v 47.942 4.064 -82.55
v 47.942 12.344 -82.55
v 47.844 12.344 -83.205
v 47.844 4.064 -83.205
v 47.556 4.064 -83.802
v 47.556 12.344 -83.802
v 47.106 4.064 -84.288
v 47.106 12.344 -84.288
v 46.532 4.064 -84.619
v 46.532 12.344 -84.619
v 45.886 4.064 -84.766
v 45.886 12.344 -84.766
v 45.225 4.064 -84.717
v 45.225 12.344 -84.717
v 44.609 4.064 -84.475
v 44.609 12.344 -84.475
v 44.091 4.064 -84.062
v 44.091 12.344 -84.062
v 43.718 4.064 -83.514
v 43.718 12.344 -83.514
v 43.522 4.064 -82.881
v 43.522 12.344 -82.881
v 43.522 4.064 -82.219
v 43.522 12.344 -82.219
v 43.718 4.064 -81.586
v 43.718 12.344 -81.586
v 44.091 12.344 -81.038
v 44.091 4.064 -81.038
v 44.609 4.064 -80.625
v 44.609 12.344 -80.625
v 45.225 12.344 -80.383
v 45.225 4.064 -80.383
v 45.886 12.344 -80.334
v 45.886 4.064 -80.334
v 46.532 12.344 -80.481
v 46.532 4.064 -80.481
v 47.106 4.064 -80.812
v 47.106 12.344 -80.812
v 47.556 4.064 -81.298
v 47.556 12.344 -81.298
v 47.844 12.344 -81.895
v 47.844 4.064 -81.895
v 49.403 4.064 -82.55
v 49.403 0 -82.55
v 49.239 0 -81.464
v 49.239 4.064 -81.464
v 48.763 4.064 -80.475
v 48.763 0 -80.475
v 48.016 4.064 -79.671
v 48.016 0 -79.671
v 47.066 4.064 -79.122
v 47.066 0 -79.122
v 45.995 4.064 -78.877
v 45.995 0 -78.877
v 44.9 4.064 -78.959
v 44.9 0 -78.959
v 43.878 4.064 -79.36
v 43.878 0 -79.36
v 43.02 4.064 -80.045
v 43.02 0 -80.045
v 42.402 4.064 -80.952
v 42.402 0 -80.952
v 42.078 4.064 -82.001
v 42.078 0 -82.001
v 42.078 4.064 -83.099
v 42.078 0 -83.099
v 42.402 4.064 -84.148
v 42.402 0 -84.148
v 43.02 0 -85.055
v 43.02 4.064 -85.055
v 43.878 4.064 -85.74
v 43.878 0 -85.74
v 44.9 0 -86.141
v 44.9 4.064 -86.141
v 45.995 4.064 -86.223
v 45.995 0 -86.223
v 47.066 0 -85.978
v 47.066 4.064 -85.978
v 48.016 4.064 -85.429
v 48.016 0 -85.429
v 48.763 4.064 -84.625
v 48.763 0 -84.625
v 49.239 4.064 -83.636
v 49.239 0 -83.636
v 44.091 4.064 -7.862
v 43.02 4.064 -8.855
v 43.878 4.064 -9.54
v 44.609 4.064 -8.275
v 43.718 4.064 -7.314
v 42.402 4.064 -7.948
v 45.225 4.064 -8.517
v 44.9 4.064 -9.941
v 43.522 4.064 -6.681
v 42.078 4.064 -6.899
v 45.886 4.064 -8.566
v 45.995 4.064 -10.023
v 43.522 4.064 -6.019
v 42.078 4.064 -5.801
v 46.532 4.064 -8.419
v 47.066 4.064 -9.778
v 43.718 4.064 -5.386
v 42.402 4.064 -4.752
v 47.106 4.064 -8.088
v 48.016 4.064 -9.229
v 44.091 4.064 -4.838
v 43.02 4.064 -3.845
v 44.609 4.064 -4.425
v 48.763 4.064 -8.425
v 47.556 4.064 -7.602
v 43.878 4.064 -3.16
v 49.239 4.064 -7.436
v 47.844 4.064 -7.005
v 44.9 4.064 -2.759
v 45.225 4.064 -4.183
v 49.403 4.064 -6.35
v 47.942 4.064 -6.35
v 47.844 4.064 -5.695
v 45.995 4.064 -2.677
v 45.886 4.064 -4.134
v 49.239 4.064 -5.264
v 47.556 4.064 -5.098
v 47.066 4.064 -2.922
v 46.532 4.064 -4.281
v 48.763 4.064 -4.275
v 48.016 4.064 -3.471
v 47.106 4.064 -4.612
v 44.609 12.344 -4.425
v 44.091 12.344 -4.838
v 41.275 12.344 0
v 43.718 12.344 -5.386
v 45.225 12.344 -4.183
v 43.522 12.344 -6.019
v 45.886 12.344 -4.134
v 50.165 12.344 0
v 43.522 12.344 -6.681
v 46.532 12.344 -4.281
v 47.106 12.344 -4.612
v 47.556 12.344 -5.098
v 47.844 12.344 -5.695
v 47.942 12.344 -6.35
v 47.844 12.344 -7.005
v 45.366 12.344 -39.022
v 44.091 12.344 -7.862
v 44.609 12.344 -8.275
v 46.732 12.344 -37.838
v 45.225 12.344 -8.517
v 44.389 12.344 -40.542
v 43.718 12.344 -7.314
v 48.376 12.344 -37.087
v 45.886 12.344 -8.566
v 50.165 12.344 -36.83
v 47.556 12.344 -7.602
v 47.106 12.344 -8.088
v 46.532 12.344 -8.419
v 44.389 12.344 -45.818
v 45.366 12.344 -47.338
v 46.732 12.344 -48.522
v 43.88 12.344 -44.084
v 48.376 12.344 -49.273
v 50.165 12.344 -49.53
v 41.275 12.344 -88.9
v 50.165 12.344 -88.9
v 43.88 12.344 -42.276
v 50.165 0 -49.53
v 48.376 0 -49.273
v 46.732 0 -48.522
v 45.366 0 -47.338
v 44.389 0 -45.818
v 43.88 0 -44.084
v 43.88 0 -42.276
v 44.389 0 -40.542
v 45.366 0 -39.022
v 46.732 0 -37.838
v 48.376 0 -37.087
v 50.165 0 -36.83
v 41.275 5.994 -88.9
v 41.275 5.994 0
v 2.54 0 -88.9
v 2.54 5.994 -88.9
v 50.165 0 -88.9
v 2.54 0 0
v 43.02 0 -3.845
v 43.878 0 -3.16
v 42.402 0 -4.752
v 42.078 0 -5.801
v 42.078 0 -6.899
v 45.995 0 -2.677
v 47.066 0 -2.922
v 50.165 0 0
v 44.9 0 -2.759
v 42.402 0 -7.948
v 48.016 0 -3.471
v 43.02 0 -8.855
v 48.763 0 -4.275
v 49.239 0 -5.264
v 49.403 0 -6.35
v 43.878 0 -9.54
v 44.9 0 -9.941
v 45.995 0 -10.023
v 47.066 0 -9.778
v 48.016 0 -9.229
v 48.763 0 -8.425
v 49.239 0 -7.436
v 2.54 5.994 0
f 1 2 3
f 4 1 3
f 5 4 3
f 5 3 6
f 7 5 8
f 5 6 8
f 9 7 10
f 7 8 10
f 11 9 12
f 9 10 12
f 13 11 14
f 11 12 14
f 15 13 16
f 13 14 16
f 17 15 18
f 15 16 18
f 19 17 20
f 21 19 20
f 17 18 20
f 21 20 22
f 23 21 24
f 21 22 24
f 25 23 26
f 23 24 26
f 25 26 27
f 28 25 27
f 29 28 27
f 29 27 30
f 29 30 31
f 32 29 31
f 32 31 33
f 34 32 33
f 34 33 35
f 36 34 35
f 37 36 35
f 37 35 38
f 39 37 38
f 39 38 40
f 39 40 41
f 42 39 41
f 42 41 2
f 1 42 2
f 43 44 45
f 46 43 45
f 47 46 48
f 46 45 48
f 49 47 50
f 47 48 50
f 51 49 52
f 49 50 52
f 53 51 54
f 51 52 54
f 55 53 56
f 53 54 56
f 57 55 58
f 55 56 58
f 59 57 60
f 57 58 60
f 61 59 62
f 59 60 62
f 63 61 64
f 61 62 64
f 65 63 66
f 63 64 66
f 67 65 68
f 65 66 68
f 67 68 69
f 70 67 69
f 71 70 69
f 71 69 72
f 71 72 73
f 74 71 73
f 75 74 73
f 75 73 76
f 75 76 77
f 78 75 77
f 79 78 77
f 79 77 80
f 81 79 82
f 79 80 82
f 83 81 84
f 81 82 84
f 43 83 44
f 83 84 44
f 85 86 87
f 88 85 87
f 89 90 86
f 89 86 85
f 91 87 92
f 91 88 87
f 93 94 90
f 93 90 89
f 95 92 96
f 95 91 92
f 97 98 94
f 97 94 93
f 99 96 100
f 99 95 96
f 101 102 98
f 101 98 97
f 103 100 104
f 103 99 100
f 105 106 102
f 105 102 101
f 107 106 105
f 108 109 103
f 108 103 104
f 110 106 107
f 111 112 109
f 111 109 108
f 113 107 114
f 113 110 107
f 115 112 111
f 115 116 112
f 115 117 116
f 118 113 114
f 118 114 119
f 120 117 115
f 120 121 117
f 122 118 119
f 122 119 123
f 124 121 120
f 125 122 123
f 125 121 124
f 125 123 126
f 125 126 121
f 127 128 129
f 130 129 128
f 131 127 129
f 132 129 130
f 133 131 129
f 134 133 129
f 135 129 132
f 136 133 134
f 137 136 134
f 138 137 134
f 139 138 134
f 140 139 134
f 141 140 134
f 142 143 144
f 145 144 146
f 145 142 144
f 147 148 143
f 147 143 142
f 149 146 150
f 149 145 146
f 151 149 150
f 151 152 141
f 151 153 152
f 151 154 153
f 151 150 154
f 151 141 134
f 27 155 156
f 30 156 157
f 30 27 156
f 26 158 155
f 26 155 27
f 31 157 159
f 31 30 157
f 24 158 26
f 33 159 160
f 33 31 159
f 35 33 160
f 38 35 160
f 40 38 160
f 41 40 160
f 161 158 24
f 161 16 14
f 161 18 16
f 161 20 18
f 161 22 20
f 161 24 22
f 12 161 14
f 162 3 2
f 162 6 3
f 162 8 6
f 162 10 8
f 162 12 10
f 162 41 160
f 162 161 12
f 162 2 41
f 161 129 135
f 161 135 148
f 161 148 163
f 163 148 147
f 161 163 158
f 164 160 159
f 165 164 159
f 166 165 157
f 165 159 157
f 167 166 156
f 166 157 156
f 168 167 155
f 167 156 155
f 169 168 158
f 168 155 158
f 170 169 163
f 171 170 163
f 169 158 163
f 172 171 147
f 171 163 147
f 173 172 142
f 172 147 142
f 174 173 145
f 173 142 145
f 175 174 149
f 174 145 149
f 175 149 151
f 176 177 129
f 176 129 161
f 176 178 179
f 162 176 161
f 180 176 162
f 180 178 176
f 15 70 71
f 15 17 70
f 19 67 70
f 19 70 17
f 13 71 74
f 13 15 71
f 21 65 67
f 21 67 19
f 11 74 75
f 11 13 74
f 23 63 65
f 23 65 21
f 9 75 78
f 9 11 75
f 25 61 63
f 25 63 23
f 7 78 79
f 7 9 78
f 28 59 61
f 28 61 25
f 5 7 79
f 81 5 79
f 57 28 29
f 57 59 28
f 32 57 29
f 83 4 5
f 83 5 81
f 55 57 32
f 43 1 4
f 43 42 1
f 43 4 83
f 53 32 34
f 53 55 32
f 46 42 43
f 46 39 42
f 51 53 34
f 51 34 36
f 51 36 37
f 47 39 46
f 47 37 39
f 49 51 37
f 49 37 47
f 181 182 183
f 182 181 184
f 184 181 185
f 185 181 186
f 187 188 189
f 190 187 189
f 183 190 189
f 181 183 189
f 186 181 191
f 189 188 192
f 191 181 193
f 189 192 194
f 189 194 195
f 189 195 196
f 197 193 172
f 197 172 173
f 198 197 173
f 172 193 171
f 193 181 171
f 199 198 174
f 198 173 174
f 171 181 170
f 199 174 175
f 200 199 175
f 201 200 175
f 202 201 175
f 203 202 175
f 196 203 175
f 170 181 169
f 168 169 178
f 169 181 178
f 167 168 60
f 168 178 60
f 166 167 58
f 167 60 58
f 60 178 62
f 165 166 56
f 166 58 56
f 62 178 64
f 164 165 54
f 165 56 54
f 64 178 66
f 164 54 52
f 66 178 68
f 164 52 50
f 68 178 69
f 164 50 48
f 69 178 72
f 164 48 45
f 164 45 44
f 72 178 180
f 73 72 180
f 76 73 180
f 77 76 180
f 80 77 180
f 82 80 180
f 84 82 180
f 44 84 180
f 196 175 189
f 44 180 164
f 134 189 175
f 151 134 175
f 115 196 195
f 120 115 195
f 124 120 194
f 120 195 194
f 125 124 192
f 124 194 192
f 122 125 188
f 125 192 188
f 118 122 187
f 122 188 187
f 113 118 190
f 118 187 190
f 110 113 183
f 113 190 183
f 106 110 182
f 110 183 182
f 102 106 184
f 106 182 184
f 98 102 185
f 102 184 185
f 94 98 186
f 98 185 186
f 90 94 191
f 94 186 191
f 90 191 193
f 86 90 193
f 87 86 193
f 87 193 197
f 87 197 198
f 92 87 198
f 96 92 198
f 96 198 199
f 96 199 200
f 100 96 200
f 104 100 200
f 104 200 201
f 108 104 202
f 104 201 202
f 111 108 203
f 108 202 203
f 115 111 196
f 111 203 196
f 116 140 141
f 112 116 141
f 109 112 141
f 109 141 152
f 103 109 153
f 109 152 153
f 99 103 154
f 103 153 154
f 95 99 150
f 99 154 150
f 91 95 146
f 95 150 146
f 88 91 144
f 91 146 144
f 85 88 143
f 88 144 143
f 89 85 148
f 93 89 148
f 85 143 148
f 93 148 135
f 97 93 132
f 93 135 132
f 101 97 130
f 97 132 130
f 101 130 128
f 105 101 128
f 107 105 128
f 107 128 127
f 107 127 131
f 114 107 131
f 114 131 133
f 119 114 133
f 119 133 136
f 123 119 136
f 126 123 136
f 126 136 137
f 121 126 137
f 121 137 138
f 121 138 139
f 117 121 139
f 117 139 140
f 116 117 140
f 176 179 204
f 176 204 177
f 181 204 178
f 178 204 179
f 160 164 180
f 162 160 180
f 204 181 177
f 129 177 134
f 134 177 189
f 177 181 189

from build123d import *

# Parameters (mm, degrees)
SKETCH1_W               = 41.275
SKETCH1_H               = 88.9
BOSS_EXTRUDE1_DEPTH     = 5.9944
SKETCH1_5_W             = 8.89
SKETCH1_5_H             = 88.9
BOSS_EXTRUDE2_DEPTH     = 12.3444
SKETCH3_R               = 2.2225
CUT_EXTRUDE1_DEPTH      = 1
CUT_EXTRUDE1_DEPTH_BACK = 13.3444
SKETCH4_R               = 3.683
CUT_EXTRUDE2_DEPTH      = 4.064
SKETCH5_W               = 2.54
SKETCH5_H               = 88.9
CUT_EXTRUDE3_DEPTH      = 7.35
CUT_EXTRUDE3_DEPTH_BACK = 6.9944
SKETCH6_R               = 6.35
CUT_EXTRUDE4_DEPTH      = 1
CUT_EXTRUDE4_DEPTH_BACK = 13.3444


with BuildPart() as part:
    # Sketch1 → Boss-Extrude1 (new body)
    with BuildSketch(Plane(origin=(0, 0, 0), x_dir=(1, 0, 0), z_dir=(0, 1, 0))):
        with Locations((20.6375, 44.45)):
            Rectangle(SKETCH1_W, SKETCH1_H)
    extrude(amount=BOSS_EXTRUDE1_DEPTH)

    # Sketch1<5> → Boss-Extrude2 (add)
    with BuildSketch(Plane(origin=(0, 0, 0), x_dir=(1, 0, 0), z_dir=(0, 1, 0))):
        with Locations((45.72, 44.45)):
            Rectangle(SKETCH1_5_W, SKETCH1_5_H)
    extrude(amount=BOSS_EXTRUDE2_DEPTH)

    # Sketch3 → Cut-Extrude1 (cut, two sides)
    with BuildSketch(Plane(origin=(0, 12.3444, 0), x_dir=(1, 0, 0), z_dir=(0, 1, 0))) as cut_extrude1_sk:
        with Locations((45.72, 82.55)):
            Circle(SKETCH3_R)
        with Locations((45.72, 6.35)):
            Circle(SKETCH3_R)
    extrude(amount=CUT_EXTRUDE1_DEPTH, mode=Mode.SUBTRACT)
    extrude(cut_extrude1_sk.sketch, amount=-CUT_EXTRUDE1_DEPTH_BACK, mode=Mode.SUBTRACT)

    # Sketch4 → Cut-Extrude2 (cut)
    with BuildSketch(Plane.XZ):
        with Locations((45.72, -6.35)):
            Circle(SKETCH4_R)
        with Locations((45.72, -82.55)):
            Circle(SKETCH4_R)
    extrude(amount=-CUT_EXTRUDE2_DEPTH, mode=Mode.SUBTRACT)

    # Sketch5 → Cut-Extrude3 (cut, two sides)
    with BuildSketch(Plane(origin=(0, 5.9944, 0), x_dir=(1, 0, 0), z_dir=(0, 1, 0))) as cut_extrude3_sk:
        with Locations((1.27, 44.45)):
            Rectangle(SKETCH5_W, SKETCH5_H)
    extrude(amount=CUT_EXTRUDE3_DEPTH, mode=Mode.SUBTRACT)
    extrude(cut_extrude3_sk.sketch, amount=-CUT_EXTRUDE3_DEPTH_BACK, mode=Mode.SUBTRACT)

    # Sketch6 → Cut-Extrude4 (cut, two sides)
    with BuildSketch(Plane(origin=(0, 12.3444, 0), x_dir=(1, 0, 0), z_dir=(0, 1, 0))) as cut_extrude4_sk:
        with Locations((50.165, 43.18)):
            Circle(SKETCH6_R)
    extrude(amount=CUT_EXTRUDE4_DEPTH, mode=Mode.SUBTRACT)
    extrude(cut_extrude4_sk.sketch, amount=-CUT_EXTRUDE4_DEPTH_BACK, mode=Mode.SUBTRACT)


solid = part.part
